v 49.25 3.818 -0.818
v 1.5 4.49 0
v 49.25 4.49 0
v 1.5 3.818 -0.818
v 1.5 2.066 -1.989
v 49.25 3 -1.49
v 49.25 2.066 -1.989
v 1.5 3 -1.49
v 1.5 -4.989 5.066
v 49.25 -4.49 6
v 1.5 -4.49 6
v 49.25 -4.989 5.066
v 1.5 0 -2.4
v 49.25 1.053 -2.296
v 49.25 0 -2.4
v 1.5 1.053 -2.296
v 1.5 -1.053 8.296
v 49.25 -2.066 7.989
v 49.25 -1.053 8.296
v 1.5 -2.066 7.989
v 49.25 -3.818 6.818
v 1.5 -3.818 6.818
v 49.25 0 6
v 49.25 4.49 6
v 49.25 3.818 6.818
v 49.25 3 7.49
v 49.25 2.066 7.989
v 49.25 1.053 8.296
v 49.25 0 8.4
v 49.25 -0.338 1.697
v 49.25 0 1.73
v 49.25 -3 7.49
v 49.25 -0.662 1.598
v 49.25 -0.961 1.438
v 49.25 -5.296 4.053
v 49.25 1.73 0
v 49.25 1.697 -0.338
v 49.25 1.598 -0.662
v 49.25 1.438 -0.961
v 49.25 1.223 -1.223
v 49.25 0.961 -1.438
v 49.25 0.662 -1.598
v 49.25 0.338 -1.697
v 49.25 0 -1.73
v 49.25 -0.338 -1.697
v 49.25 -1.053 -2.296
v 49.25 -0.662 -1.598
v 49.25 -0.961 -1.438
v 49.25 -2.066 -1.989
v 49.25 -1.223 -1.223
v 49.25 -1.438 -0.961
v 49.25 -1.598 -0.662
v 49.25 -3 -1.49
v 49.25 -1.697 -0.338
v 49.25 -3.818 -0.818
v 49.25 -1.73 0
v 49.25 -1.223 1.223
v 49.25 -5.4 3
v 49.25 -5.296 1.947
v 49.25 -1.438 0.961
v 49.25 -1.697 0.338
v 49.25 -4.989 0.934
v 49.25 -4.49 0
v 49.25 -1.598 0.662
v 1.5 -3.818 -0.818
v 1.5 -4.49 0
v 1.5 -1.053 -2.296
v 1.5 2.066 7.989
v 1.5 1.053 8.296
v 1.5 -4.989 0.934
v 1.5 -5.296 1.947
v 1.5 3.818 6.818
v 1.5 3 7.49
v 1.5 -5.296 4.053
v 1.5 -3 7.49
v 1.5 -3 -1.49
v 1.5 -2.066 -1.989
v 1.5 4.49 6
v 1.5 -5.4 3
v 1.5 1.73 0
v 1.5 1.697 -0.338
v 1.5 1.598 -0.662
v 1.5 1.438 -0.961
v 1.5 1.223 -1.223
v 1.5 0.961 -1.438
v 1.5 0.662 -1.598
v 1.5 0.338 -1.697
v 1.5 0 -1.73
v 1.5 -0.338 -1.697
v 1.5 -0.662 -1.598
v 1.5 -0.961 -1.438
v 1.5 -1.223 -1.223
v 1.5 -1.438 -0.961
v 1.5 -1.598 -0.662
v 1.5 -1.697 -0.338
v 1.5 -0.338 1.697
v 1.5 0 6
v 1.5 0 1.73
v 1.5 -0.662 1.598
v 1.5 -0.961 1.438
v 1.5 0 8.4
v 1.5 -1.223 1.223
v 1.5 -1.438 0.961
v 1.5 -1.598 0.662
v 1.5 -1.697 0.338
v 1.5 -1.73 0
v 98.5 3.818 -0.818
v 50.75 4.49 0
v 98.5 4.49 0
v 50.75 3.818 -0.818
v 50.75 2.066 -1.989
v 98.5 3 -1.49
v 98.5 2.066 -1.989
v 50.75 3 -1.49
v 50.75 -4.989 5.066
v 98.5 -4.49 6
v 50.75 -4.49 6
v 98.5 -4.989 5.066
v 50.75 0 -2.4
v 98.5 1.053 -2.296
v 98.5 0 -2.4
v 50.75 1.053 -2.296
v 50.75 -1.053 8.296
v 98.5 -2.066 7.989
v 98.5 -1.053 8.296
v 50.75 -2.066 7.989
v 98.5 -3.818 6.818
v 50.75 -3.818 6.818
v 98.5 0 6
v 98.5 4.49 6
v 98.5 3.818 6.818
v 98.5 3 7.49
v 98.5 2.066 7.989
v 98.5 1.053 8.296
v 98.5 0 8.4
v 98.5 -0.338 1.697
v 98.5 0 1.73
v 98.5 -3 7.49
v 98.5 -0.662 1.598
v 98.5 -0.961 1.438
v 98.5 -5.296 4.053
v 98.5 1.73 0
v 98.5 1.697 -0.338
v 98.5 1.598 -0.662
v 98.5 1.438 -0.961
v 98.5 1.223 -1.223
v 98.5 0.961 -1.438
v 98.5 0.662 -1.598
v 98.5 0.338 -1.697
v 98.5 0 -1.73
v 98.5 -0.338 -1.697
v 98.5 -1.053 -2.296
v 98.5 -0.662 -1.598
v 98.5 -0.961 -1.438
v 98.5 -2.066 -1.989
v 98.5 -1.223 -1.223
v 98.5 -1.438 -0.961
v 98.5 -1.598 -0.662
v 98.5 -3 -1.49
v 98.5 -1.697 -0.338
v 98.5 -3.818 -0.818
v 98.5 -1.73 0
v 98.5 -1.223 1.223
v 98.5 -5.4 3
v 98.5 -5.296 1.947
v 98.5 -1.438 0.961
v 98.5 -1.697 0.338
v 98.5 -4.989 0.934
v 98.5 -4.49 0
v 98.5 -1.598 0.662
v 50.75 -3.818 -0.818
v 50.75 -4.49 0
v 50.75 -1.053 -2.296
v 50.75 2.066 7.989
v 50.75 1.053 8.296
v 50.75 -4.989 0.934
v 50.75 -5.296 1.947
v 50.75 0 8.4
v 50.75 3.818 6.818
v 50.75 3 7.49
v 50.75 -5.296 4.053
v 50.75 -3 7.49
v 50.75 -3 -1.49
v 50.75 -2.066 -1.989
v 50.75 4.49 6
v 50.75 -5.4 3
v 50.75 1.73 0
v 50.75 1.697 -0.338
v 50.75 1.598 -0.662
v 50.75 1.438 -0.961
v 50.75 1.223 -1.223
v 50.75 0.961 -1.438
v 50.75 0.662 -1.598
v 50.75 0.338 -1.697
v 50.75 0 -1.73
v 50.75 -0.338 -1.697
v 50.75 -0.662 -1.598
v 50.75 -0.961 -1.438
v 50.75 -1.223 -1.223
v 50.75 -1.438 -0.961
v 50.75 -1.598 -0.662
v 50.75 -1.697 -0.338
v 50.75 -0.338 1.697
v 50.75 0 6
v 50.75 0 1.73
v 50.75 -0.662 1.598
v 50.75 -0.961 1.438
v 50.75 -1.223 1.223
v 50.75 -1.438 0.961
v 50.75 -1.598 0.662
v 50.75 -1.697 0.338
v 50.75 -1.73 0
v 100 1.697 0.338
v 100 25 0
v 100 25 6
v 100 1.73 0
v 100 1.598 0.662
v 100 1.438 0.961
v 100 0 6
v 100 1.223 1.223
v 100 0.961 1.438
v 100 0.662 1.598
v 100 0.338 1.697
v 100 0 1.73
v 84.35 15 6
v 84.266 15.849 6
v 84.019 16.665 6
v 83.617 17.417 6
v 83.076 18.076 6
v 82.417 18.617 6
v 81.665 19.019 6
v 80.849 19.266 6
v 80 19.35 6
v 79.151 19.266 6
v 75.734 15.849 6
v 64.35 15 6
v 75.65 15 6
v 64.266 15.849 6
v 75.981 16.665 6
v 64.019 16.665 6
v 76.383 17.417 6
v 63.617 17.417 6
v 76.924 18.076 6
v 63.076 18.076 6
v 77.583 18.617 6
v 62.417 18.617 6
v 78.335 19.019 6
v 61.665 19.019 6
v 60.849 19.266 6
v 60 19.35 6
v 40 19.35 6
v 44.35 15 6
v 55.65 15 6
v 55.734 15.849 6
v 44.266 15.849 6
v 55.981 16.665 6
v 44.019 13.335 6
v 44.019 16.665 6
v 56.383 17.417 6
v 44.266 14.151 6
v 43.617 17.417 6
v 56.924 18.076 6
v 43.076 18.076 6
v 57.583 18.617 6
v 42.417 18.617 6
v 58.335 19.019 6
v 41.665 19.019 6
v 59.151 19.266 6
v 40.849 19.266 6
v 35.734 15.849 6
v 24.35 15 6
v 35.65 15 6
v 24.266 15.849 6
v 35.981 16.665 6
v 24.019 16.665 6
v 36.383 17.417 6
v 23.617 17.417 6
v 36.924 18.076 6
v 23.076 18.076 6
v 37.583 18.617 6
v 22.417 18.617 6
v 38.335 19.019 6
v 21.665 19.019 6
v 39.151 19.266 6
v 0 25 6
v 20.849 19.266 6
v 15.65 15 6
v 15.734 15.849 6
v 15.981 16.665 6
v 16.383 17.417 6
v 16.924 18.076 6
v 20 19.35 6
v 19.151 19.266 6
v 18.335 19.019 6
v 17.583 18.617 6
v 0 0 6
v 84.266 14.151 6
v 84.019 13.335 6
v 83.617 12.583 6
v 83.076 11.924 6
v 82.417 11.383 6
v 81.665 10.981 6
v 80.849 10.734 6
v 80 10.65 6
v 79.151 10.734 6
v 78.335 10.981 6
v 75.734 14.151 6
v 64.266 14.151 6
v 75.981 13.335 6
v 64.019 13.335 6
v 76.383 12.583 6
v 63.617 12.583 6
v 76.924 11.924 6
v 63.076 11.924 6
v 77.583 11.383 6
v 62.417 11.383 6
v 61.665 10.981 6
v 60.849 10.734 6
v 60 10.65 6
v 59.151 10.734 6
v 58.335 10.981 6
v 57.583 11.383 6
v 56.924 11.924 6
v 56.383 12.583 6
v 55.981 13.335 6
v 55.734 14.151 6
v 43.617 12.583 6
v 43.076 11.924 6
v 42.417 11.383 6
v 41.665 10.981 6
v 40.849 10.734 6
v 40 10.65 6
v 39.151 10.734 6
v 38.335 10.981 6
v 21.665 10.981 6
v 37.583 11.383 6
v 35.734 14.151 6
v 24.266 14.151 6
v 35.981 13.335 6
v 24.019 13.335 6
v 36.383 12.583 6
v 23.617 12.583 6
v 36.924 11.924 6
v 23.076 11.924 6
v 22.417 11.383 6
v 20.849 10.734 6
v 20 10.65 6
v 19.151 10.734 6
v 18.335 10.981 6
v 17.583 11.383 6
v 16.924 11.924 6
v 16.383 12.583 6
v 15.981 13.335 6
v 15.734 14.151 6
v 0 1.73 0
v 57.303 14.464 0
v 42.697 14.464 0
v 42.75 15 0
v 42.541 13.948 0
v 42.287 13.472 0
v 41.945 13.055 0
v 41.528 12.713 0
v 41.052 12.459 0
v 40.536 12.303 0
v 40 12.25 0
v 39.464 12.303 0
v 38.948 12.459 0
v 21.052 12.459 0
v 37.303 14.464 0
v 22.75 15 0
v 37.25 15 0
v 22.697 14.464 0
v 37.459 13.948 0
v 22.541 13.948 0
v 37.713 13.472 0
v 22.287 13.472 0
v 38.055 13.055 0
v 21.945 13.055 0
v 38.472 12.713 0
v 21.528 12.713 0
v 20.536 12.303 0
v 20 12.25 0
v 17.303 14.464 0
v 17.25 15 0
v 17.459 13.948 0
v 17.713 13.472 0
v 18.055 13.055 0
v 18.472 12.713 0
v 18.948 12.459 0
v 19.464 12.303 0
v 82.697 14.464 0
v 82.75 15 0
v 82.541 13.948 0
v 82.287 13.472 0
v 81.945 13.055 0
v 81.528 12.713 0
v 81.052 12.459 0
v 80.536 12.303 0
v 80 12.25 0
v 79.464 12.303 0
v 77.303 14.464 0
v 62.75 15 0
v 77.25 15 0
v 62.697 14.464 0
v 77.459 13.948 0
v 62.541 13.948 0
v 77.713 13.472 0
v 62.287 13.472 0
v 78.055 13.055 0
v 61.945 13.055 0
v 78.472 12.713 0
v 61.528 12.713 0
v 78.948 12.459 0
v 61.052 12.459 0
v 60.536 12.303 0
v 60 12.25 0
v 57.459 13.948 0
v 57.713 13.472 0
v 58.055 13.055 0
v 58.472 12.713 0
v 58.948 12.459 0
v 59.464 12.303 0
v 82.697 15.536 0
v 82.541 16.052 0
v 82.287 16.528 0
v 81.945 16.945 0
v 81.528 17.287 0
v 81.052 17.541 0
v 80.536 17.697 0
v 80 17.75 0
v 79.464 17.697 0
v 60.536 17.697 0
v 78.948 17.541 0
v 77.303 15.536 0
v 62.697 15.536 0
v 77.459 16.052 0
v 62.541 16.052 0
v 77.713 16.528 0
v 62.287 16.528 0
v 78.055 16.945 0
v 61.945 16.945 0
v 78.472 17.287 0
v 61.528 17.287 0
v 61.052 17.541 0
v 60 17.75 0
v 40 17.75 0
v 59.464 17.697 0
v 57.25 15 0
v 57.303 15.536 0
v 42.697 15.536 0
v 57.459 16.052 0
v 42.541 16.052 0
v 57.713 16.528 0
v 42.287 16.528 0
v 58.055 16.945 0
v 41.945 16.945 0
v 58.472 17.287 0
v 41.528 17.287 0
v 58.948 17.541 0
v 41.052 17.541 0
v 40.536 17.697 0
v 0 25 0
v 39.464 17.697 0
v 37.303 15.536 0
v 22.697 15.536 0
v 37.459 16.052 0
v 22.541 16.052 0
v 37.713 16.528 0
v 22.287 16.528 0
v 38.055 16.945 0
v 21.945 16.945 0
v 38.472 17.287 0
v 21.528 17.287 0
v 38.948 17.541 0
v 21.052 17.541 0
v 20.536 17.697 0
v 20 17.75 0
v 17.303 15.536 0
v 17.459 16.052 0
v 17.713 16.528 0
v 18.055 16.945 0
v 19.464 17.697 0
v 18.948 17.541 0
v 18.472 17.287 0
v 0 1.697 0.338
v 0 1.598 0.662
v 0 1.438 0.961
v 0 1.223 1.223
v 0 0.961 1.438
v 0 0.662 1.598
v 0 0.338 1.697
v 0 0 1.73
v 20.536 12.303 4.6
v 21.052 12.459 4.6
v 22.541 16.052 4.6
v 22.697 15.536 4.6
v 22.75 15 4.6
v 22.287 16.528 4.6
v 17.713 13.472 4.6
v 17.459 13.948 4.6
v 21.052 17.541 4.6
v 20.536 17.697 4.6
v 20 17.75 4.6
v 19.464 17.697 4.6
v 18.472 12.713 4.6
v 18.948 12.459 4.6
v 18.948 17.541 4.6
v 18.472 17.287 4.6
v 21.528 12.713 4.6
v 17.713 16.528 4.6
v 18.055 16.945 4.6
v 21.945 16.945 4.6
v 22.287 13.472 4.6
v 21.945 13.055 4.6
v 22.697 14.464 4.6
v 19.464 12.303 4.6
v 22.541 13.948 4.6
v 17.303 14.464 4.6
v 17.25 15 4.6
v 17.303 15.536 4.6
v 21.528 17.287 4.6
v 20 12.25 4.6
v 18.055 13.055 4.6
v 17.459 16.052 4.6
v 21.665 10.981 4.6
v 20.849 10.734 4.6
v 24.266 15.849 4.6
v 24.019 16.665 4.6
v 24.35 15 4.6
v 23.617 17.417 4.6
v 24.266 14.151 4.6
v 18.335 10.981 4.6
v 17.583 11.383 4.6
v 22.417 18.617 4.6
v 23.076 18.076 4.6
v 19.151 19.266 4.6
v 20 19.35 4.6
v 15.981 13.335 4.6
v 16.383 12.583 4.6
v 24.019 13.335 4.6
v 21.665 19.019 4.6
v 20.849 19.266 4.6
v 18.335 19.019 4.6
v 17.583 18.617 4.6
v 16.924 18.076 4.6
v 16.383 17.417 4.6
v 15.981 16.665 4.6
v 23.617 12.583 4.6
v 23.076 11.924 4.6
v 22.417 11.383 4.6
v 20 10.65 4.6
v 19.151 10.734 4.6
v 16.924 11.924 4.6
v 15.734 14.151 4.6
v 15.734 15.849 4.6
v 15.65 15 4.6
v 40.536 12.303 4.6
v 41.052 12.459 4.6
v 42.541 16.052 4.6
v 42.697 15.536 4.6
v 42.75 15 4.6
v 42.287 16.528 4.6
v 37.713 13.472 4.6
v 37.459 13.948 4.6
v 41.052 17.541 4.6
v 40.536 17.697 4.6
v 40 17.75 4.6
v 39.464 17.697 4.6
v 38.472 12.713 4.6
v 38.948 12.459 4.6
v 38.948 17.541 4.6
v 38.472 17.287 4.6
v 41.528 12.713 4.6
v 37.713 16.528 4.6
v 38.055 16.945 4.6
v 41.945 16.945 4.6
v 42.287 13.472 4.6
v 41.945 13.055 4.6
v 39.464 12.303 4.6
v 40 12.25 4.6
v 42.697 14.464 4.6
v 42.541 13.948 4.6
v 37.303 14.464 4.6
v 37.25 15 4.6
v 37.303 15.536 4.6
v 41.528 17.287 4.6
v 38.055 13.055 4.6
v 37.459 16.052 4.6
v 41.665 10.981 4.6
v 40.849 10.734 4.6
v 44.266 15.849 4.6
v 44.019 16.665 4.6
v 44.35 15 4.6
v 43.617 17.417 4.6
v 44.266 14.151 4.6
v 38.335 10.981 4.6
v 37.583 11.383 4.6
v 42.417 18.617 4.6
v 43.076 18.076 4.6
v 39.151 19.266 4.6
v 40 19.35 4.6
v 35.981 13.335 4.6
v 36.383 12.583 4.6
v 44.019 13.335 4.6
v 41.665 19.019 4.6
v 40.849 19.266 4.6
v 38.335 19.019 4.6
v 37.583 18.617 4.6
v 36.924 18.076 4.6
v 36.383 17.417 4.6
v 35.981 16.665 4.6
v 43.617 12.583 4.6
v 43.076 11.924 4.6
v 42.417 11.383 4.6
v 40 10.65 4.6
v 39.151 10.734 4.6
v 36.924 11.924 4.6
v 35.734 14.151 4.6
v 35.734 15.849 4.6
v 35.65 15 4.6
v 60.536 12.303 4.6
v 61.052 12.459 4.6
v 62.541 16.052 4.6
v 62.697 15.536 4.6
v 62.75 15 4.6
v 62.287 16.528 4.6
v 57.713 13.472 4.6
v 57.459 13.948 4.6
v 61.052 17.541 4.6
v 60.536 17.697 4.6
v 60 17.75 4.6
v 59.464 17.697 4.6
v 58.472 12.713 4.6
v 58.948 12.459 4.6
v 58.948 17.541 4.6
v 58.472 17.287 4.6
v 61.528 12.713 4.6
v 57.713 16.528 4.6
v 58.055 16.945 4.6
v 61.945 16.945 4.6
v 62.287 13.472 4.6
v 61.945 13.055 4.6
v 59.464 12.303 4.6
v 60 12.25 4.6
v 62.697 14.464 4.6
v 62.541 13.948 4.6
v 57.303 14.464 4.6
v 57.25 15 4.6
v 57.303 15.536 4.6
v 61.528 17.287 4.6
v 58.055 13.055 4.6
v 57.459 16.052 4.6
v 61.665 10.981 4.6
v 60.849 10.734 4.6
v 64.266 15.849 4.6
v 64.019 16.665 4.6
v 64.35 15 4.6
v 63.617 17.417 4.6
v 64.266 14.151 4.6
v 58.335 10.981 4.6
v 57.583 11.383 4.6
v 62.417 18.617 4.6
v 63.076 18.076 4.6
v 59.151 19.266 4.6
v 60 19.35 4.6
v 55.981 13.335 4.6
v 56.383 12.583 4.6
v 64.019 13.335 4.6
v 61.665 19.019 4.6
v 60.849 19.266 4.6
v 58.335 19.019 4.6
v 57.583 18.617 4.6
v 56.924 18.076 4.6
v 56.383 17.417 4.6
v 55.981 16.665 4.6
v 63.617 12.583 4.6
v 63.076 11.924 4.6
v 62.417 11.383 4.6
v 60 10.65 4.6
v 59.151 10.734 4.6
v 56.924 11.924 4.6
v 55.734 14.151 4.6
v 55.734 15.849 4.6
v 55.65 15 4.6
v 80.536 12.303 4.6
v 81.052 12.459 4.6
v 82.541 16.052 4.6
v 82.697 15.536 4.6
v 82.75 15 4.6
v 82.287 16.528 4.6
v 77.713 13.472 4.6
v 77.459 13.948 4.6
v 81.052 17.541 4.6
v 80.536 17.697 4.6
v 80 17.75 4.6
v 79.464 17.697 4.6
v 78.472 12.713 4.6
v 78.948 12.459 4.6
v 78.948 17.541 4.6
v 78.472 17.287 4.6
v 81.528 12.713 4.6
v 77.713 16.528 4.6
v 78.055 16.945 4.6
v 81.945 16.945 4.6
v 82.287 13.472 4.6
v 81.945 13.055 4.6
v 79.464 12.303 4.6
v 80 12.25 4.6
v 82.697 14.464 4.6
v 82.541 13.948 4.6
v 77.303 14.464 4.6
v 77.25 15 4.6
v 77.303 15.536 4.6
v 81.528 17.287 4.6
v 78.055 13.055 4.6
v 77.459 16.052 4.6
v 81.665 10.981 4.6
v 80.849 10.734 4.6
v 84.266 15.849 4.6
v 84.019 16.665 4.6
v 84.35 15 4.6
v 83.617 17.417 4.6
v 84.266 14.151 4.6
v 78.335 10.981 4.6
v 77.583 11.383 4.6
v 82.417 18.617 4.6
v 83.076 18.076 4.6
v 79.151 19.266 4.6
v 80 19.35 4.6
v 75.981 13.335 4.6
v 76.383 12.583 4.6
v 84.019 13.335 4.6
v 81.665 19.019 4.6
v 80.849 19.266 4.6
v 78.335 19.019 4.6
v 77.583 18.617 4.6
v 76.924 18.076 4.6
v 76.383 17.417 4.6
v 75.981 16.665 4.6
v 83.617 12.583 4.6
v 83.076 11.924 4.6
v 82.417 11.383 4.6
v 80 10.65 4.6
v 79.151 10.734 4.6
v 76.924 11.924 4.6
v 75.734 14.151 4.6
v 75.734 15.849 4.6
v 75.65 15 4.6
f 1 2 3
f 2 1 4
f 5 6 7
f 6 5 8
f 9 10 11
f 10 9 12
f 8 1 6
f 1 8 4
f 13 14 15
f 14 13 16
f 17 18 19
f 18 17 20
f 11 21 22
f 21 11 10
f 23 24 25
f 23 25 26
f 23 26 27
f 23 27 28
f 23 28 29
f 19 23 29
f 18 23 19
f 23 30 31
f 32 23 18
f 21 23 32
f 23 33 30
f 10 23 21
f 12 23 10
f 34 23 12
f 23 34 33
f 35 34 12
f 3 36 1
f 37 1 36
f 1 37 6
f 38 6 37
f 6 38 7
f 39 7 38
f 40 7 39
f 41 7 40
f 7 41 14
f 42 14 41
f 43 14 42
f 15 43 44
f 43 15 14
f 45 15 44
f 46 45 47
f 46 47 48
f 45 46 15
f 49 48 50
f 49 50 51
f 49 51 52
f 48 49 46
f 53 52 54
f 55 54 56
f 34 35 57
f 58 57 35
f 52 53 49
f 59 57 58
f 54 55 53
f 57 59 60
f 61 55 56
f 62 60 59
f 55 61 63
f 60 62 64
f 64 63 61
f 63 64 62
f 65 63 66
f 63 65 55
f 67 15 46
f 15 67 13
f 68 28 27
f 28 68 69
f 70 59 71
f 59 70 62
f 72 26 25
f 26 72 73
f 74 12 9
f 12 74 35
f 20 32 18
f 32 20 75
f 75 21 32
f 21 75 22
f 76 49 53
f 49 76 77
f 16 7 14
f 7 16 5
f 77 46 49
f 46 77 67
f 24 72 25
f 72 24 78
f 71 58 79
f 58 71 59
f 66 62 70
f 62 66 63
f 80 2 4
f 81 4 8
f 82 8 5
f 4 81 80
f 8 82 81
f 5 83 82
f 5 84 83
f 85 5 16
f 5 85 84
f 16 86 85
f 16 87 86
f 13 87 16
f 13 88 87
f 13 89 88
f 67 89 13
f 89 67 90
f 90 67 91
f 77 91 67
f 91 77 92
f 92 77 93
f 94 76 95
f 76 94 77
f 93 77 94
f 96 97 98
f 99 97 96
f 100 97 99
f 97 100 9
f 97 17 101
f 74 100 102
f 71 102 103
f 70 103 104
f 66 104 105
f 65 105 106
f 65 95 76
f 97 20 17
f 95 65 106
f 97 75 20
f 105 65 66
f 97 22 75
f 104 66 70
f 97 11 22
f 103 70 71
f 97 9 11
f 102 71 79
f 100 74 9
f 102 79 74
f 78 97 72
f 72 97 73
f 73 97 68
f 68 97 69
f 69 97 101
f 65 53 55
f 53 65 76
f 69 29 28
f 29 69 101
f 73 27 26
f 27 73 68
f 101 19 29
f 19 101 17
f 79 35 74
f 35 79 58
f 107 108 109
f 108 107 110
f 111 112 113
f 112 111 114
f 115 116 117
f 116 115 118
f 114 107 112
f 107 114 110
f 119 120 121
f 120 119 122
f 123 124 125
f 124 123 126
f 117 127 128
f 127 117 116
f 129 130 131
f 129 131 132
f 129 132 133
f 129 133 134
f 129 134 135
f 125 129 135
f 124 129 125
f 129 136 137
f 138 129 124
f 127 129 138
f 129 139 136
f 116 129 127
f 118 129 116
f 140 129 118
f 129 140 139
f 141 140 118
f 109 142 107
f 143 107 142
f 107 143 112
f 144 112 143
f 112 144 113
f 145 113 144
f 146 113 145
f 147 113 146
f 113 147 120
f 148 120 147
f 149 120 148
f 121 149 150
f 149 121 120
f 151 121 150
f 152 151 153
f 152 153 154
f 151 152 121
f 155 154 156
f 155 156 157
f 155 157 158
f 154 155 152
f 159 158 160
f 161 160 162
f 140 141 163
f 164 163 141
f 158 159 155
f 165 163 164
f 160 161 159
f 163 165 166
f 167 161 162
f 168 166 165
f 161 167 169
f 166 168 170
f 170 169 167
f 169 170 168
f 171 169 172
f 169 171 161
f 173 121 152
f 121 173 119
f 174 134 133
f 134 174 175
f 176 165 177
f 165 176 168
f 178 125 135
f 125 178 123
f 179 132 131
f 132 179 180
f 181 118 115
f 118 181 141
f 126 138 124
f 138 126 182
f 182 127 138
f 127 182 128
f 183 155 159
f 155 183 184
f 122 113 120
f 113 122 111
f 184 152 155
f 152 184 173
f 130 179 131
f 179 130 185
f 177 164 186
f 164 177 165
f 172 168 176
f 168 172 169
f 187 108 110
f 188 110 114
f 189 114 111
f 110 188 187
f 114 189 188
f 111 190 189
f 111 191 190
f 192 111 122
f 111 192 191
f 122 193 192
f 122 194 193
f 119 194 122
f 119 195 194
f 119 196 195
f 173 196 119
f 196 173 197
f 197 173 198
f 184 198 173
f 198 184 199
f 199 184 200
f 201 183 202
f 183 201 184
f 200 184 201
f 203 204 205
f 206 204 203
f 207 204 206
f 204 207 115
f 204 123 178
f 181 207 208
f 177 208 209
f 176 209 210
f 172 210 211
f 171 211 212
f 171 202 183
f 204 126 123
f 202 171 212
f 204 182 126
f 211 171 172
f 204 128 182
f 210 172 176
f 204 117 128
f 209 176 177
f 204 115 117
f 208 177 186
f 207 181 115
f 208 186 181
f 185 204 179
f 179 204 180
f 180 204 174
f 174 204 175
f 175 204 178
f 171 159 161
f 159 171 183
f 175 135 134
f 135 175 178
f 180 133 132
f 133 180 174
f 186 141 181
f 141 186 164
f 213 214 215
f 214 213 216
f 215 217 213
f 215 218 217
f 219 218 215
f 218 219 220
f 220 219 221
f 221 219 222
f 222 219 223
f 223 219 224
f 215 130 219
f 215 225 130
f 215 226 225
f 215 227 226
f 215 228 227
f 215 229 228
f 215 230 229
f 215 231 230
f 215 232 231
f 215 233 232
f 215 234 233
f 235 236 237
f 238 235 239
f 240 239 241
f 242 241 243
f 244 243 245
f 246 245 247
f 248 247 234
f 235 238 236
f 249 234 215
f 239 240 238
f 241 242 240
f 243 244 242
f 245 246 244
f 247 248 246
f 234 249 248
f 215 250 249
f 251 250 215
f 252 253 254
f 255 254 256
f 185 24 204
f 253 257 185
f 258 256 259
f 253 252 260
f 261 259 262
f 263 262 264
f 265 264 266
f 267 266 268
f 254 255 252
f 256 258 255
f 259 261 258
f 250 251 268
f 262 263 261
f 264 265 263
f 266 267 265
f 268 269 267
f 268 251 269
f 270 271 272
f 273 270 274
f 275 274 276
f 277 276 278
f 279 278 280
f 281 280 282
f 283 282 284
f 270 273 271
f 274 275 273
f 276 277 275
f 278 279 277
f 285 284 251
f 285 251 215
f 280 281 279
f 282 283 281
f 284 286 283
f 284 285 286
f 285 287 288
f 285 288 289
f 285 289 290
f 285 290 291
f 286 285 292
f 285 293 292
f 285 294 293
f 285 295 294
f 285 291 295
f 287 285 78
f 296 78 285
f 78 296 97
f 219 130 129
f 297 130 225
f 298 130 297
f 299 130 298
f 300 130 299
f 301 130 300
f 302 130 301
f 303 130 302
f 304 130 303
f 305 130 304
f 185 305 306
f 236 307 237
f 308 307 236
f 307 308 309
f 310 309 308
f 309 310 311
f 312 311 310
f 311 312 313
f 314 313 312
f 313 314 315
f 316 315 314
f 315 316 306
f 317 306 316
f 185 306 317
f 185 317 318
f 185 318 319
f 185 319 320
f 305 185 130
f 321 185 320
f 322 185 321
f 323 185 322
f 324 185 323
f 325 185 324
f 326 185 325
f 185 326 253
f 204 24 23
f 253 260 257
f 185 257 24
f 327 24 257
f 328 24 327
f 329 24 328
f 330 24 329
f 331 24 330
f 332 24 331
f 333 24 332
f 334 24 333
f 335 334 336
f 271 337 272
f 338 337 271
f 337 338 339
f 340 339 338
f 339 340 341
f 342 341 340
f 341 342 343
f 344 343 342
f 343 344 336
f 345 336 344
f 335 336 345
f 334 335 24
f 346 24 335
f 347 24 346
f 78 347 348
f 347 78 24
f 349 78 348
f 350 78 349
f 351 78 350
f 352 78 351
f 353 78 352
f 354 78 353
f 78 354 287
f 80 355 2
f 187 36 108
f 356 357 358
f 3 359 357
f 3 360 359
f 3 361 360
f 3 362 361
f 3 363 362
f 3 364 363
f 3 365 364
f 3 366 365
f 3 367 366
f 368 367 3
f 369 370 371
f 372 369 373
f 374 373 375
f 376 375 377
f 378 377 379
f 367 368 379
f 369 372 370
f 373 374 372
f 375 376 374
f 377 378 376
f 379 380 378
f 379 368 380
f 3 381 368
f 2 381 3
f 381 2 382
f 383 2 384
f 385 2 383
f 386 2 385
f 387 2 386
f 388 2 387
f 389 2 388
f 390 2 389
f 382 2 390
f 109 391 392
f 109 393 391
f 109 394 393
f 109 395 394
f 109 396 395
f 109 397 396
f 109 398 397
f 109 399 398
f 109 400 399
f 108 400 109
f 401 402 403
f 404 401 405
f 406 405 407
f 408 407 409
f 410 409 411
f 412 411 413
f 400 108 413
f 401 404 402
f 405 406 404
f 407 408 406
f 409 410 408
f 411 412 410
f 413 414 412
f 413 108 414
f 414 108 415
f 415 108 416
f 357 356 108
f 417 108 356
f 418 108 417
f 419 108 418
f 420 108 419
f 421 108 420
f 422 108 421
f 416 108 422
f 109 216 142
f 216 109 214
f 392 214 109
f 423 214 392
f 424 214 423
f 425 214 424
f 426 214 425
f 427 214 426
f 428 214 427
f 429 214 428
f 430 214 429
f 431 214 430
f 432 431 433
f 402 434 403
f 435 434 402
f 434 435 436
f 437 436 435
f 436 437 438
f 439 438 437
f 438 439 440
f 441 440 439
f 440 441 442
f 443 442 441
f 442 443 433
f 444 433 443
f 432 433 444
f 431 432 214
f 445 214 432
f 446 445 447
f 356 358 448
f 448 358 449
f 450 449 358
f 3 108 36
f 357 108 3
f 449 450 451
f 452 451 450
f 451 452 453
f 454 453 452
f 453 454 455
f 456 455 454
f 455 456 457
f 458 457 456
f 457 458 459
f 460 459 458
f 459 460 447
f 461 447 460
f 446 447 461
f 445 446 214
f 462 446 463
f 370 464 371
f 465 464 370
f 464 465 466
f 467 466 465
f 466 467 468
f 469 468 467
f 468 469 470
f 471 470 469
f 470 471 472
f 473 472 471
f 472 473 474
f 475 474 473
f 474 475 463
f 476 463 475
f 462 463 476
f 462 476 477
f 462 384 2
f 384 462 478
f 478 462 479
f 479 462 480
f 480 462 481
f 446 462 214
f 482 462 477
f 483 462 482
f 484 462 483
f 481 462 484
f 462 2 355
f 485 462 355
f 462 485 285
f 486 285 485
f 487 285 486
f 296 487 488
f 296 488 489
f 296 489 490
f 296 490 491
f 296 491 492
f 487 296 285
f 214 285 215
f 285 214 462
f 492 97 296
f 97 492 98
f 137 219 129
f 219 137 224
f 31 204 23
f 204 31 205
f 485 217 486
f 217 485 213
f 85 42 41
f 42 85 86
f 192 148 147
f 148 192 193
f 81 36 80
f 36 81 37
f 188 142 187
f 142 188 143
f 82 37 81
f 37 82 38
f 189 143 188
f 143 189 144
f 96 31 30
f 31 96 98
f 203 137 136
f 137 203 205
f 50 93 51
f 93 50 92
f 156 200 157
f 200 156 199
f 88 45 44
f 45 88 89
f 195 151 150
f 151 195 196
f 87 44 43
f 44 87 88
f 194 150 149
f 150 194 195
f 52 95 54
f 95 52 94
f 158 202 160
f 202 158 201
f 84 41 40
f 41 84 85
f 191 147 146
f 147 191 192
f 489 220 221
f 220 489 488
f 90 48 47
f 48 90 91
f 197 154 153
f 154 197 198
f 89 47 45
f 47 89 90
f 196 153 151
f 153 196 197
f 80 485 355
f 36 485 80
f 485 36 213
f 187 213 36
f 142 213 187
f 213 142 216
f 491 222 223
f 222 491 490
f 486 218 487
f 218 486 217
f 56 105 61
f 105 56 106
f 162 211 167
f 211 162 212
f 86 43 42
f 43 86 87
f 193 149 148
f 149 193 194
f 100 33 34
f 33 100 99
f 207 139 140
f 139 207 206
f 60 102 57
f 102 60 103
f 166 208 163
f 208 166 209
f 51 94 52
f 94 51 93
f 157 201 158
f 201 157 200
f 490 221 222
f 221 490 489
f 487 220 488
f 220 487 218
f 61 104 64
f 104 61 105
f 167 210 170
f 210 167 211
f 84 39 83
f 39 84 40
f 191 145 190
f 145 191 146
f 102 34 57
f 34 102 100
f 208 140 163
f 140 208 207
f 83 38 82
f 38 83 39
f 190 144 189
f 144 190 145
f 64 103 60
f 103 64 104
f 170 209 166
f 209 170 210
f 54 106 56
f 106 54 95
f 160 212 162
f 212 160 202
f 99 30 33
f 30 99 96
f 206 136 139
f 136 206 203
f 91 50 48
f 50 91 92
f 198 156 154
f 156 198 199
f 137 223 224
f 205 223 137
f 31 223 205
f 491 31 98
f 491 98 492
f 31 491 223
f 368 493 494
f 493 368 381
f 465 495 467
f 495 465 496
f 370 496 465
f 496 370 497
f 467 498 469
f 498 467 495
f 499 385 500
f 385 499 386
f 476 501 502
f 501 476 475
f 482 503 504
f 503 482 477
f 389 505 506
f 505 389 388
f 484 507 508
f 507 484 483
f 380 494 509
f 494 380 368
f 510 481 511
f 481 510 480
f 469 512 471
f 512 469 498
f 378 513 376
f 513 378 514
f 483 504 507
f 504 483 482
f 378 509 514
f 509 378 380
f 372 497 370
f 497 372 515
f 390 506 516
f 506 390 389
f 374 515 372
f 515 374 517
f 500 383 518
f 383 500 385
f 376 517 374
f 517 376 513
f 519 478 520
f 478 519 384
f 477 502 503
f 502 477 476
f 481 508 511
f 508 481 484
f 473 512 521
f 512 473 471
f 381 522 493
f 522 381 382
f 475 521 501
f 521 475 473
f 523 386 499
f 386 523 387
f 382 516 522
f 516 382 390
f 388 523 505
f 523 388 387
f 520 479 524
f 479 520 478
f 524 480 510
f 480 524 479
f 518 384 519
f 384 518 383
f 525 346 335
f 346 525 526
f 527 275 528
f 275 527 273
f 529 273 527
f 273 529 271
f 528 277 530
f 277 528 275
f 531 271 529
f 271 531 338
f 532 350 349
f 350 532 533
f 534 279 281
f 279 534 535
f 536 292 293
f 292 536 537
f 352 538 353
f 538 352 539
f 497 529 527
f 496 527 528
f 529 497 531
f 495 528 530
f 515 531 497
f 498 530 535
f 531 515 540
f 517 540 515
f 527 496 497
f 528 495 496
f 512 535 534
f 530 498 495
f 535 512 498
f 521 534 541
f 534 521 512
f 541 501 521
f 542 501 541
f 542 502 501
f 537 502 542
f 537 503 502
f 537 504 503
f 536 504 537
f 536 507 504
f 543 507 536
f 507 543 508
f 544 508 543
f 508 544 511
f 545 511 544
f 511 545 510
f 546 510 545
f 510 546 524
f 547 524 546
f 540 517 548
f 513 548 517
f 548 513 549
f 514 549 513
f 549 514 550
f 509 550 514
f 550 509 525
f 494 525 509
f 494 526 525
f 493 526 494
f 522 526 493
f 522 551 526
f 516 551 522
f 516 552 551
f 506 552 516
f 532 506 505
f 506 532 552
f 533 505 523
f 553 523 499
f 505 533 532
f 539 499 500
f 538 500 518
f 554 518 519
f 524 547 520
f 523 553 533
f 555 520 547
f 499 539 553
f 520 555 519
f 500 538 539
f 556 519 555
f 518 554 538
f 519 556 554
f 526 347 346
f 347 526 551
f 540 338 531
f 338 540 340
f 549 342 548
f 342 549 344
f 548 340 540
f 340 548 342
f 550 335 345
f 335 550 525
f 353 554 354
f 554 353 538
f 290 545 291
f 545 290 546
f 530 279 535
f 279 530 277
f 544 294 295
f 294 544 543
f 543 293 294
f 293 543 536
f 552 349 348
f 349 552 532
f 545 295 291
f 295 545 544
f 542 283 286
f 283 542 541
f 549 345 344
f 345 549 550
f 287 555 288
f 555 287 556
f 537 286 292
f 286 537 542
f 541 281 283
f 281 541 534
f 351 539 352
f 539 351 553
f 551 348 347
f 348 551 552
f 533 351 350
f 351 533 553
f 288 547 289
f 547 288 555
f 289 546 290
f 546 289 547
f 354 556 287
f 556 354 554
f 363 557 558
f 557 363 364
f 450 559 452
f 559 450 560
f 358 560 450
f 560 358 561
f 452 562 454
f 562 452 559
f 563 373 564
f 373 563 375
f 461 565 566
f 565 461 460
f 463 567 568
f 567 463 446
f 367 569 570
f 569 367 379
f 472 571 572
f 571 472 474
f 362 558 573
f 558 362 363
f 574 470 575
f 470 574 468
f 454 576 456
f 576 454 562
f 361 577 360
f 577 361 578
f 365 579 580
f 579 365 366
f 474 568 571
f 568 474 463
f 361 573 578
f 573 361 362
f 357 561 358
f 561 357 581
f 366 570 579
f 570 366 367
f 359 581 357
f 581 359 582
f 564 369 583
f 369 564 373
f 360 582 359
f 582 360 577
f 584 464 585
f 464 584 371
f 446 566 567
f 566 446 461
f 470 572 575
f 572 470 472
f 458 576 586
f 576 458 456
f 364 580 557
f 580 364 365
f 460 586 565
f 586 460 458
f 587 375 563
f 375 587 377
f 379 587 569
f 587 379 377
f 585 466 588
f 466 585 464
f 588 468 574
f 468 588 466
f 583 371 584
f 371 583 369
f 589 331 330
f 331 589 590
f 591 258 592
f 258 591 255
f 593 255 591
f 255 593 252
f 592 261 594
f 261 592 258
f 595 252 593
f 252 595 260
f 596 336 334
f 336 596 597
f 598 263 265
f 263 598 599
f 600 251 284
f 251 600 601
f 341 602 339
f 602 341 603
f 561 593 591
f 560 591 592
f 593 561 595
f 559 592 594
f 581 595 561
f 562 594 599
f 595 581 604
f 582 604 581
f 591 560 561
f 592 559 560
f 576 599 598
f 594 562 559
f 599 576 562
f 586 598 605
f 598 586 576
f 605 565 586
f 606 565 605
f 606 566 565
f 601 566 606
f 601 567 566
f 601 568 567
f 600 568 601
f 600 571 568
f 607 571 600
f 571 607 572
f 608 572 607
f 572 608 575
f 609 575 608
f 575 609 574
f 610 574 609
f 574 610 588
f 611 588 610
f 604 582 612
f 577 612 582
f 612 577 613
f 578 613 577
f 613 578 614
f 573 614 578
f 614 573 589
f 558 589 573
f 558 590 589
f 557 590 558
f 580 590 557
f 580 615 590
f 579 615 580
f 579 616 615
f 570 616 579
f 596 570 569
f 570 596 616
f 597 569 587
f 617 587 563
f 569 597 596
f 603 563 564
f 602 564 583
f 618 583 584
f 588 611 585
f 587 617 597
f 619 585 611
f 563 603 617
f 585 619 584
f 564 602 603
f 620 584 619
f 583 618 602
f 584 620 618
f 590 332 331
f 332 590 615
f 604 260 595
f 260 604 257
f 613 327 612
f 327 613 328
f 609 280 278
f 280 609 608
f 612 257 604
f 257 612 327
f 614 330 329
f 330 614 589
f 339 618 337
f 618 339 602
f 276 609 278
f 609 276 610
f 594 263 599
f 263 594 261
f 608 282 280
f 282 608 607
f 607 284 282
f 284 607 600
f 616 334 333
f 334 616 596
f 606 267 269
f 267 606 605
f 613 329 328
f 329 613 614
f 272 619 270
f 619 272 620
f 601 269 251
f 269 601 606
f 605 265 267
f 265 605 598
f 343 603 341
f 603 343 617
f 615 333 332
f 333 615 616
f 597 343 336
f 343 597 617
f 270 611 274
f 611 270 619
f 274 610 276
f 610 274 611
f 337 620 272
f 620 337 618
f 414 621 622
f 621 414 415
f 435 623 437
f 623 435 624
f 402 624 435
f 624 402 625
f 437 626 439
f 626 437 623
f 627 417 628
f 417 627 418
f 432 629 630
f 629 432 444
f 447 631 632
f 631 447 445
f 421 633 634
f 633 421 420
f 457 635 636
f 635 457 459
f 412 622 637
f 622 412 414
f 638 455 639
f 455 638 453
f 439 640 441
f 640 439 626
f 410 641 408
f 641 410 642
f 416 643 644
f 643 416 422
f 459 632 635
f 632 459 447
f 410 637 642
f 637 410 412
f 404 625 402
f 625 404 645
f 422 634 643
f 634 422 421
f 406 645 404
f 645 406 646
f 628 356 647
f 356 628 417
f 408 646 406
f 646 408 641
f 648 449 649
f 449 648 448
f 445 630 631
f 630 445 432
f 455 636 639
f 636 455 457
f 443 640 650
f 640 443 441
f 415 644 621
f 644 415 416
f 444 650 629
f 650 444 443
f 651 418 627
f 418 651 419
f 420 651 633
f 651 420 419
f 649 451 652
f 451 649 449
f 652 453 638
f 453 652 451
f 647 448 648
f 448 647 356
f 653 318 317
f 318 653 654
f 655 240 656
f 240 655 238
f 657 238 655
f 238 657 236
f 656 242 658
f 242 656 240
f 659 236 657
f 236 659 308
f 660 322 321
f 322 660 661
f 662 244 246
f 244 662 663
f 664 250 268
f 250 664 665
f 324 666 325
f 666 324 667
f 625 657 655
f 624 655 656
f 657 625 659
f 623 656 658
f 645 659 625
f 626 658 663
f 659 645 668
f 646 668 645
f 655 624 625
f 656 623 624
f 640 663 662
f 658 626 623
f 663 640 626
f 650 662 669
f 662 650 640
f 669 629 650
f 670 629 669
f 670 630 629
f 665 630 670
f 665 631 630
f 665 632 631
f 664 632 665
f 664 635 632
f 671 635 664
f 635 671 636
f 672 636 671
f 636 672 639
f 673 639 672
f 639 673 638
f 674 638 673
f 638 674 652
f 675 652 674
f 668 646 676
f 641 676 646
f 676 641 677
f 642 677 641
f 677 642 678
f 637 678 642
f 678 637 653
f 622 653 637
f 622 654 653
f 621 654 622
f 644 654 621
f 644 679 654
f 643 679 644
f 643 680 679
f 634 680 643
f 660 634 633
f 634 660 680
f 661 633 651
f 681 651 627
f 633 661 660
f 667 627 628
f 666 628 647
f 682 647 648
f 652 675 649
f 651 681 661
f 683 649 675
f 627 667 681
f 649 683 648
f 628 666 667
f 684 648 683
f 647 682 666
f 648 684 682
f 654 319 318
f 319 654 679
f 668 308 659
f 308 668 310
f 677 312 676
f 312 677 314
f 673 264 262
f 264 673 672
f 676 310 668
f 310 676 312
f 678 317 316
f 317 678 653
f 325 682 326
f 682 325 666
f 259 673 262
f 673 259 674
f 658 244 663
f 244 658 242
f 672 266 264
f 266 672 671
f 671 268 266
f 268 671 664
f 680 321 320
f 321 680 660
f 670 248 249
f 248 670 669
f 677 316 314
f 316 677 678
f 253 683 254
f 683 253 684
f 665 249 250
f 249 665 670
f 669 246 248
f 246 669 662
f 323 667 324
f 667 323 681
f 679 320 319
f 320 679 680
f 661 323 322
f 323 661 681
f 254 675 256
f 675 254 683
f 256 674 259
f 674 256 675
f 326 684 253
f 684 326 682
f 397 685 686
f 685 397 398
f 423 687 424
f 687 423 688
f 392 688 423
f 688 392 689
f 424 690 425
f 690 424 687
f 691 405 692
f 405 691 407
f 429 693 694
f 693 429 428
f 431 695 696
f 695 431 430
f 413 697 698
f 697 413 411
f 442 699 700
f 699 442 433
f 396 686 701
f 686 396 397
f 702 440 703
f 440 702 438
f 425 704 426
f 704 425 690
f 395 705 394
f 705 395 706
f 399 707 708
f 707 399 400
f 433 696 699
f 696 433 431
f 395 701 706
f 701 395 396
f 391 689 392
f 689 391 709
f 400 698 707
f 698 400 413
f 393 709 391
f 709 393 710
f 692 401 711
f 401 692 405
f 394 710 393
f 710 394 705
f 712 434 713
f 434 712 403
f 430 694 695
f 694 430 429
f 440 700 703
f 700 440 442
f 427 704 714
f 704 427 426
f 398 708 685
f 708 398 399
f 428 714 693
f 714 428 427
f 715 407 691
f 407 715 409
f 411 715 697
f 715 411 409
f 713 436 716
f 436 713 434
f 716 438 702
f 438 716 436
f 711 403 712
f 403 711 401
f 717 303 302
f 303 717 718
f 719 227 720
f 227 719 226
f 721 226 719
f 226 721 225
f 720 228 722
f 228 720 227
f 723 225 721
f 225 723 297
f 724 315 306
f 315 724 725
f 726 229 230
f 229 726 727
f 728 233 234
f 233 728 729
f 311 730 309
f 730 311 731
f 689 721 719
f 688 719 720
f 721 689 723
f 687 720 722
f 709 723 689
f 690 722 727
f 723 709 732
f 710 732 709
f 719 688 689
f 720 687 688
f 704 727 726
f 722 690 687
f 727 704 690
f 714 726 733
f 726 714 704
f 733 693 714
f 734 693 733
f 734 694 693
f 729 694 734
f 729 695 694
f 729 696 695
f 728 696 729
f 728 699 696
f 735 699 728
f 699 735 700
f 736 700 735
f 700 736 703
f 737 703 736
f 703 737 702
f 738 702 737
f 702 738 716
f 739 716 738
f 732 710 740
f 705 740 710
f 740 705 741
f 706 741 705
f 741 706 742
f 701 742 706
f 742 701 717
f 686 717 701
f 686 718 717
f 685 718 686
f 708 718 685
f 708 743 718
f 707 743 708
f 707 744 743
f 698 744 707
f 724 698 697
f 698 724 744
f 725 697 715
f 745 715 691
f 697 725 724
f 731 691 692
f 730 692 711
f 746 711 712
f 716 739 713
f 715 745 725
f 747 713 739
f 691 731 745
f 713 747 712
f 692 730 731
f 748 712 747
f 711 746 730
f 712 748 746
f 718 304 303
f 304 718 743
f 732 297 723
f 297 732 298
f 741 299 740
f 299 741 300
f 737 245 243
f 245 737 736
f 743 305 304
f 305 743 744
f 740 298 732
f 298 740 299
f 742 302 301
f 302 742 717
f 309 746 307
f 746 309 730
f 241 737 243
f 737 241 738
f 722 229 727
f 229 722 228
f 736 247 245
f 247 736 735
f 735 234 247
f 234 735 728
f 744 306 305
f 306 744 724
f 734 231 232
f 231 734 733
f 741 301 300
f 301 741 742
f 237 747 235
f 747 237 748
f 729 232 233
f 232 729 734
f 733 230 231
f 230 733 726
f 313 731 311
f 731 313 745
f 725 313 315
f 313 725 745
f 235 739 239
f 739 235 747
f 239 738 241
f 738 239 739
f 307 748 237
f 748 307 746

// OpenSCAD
$fn = 32;

// ----------------------------------------------------------------------
// Hinge leaf: 100 x 30.4 x 10.8 mm
// ----------------------------------------------------------------------

// --- parameters (mm) ---
leaf_len = 100;           // leaf length, X
leaf_w = 25;              // leaf width, Y
leaf_t = 6;               // leaf thickness
knuckle_d = 10.8;         // knuckle diameter
knuckle_w = 47.75;        // knuckle width
knuckle_n = 2;            // number of knuckles
pin_d = 3.46;             // pin bore
gap = 1.5;                // gap between the knuckles
screw_d = 5.5;            // screw clearance
cs_d = 8.7;               // countersink diameter
cs_h = 1.4;               // countersink depth

module leaf() {
  cube([leaf_len, leaf_w, leaf_t]);
}

module knuckles() {
  /* barrels sit on the leaf edge, the pin axis at half the leaf thickness */
  for (i = [0 : knuckle_n - 1])
    translate([gap + i * (knuckle_w + gap), 0, leaf_t * 0.5])
      rotate([0, 90, 0]) cylinder(h = knuckle_w, d = knuckle_d);
}

difference() {
  union() {
    leaf();
    knuckles();
  }
  rotate([0, 90, 0]) translate([0, 0, -1])
    cylinder(h = leaf_len + 2, d = pin_d);
  translate([20, leaf_w * 0.6, -1]) cylinder(h = leaf_t + 2, d = screw_d);
  translate([20, leaf_w * 0.6, leaf_t - cs_h]) cylinder(h = cs_h + 0.5, d = cs_d);
  translate([40, leaf_w * 0.6, -1]) cylinder(h = leaf_t + 2, d = screw_d);
  translate([40, leaf_w * 0.6, leaf_t - cs_h]) cylinder(h = cs_h + 0.5, d = cs_d);
  translate([60, leaf_w * 0.6, -1]) cylinder(h = leaf_t + 2, d = screw_d);
  translate([60, leaf_w * 0.6, leaf_t - cs_h]) cylinder(h = cs_h + 0.5, d = cs_d);
  translate([80, leaf_w * 0.6, -1]) cylinder(h = leaf_t + 2, d = screw_d);
  translate([80, leaf_w * 0.6, leaf_t - cs_h]) cylinder(h = cs_h + 0.5, d = cs_d);
}
